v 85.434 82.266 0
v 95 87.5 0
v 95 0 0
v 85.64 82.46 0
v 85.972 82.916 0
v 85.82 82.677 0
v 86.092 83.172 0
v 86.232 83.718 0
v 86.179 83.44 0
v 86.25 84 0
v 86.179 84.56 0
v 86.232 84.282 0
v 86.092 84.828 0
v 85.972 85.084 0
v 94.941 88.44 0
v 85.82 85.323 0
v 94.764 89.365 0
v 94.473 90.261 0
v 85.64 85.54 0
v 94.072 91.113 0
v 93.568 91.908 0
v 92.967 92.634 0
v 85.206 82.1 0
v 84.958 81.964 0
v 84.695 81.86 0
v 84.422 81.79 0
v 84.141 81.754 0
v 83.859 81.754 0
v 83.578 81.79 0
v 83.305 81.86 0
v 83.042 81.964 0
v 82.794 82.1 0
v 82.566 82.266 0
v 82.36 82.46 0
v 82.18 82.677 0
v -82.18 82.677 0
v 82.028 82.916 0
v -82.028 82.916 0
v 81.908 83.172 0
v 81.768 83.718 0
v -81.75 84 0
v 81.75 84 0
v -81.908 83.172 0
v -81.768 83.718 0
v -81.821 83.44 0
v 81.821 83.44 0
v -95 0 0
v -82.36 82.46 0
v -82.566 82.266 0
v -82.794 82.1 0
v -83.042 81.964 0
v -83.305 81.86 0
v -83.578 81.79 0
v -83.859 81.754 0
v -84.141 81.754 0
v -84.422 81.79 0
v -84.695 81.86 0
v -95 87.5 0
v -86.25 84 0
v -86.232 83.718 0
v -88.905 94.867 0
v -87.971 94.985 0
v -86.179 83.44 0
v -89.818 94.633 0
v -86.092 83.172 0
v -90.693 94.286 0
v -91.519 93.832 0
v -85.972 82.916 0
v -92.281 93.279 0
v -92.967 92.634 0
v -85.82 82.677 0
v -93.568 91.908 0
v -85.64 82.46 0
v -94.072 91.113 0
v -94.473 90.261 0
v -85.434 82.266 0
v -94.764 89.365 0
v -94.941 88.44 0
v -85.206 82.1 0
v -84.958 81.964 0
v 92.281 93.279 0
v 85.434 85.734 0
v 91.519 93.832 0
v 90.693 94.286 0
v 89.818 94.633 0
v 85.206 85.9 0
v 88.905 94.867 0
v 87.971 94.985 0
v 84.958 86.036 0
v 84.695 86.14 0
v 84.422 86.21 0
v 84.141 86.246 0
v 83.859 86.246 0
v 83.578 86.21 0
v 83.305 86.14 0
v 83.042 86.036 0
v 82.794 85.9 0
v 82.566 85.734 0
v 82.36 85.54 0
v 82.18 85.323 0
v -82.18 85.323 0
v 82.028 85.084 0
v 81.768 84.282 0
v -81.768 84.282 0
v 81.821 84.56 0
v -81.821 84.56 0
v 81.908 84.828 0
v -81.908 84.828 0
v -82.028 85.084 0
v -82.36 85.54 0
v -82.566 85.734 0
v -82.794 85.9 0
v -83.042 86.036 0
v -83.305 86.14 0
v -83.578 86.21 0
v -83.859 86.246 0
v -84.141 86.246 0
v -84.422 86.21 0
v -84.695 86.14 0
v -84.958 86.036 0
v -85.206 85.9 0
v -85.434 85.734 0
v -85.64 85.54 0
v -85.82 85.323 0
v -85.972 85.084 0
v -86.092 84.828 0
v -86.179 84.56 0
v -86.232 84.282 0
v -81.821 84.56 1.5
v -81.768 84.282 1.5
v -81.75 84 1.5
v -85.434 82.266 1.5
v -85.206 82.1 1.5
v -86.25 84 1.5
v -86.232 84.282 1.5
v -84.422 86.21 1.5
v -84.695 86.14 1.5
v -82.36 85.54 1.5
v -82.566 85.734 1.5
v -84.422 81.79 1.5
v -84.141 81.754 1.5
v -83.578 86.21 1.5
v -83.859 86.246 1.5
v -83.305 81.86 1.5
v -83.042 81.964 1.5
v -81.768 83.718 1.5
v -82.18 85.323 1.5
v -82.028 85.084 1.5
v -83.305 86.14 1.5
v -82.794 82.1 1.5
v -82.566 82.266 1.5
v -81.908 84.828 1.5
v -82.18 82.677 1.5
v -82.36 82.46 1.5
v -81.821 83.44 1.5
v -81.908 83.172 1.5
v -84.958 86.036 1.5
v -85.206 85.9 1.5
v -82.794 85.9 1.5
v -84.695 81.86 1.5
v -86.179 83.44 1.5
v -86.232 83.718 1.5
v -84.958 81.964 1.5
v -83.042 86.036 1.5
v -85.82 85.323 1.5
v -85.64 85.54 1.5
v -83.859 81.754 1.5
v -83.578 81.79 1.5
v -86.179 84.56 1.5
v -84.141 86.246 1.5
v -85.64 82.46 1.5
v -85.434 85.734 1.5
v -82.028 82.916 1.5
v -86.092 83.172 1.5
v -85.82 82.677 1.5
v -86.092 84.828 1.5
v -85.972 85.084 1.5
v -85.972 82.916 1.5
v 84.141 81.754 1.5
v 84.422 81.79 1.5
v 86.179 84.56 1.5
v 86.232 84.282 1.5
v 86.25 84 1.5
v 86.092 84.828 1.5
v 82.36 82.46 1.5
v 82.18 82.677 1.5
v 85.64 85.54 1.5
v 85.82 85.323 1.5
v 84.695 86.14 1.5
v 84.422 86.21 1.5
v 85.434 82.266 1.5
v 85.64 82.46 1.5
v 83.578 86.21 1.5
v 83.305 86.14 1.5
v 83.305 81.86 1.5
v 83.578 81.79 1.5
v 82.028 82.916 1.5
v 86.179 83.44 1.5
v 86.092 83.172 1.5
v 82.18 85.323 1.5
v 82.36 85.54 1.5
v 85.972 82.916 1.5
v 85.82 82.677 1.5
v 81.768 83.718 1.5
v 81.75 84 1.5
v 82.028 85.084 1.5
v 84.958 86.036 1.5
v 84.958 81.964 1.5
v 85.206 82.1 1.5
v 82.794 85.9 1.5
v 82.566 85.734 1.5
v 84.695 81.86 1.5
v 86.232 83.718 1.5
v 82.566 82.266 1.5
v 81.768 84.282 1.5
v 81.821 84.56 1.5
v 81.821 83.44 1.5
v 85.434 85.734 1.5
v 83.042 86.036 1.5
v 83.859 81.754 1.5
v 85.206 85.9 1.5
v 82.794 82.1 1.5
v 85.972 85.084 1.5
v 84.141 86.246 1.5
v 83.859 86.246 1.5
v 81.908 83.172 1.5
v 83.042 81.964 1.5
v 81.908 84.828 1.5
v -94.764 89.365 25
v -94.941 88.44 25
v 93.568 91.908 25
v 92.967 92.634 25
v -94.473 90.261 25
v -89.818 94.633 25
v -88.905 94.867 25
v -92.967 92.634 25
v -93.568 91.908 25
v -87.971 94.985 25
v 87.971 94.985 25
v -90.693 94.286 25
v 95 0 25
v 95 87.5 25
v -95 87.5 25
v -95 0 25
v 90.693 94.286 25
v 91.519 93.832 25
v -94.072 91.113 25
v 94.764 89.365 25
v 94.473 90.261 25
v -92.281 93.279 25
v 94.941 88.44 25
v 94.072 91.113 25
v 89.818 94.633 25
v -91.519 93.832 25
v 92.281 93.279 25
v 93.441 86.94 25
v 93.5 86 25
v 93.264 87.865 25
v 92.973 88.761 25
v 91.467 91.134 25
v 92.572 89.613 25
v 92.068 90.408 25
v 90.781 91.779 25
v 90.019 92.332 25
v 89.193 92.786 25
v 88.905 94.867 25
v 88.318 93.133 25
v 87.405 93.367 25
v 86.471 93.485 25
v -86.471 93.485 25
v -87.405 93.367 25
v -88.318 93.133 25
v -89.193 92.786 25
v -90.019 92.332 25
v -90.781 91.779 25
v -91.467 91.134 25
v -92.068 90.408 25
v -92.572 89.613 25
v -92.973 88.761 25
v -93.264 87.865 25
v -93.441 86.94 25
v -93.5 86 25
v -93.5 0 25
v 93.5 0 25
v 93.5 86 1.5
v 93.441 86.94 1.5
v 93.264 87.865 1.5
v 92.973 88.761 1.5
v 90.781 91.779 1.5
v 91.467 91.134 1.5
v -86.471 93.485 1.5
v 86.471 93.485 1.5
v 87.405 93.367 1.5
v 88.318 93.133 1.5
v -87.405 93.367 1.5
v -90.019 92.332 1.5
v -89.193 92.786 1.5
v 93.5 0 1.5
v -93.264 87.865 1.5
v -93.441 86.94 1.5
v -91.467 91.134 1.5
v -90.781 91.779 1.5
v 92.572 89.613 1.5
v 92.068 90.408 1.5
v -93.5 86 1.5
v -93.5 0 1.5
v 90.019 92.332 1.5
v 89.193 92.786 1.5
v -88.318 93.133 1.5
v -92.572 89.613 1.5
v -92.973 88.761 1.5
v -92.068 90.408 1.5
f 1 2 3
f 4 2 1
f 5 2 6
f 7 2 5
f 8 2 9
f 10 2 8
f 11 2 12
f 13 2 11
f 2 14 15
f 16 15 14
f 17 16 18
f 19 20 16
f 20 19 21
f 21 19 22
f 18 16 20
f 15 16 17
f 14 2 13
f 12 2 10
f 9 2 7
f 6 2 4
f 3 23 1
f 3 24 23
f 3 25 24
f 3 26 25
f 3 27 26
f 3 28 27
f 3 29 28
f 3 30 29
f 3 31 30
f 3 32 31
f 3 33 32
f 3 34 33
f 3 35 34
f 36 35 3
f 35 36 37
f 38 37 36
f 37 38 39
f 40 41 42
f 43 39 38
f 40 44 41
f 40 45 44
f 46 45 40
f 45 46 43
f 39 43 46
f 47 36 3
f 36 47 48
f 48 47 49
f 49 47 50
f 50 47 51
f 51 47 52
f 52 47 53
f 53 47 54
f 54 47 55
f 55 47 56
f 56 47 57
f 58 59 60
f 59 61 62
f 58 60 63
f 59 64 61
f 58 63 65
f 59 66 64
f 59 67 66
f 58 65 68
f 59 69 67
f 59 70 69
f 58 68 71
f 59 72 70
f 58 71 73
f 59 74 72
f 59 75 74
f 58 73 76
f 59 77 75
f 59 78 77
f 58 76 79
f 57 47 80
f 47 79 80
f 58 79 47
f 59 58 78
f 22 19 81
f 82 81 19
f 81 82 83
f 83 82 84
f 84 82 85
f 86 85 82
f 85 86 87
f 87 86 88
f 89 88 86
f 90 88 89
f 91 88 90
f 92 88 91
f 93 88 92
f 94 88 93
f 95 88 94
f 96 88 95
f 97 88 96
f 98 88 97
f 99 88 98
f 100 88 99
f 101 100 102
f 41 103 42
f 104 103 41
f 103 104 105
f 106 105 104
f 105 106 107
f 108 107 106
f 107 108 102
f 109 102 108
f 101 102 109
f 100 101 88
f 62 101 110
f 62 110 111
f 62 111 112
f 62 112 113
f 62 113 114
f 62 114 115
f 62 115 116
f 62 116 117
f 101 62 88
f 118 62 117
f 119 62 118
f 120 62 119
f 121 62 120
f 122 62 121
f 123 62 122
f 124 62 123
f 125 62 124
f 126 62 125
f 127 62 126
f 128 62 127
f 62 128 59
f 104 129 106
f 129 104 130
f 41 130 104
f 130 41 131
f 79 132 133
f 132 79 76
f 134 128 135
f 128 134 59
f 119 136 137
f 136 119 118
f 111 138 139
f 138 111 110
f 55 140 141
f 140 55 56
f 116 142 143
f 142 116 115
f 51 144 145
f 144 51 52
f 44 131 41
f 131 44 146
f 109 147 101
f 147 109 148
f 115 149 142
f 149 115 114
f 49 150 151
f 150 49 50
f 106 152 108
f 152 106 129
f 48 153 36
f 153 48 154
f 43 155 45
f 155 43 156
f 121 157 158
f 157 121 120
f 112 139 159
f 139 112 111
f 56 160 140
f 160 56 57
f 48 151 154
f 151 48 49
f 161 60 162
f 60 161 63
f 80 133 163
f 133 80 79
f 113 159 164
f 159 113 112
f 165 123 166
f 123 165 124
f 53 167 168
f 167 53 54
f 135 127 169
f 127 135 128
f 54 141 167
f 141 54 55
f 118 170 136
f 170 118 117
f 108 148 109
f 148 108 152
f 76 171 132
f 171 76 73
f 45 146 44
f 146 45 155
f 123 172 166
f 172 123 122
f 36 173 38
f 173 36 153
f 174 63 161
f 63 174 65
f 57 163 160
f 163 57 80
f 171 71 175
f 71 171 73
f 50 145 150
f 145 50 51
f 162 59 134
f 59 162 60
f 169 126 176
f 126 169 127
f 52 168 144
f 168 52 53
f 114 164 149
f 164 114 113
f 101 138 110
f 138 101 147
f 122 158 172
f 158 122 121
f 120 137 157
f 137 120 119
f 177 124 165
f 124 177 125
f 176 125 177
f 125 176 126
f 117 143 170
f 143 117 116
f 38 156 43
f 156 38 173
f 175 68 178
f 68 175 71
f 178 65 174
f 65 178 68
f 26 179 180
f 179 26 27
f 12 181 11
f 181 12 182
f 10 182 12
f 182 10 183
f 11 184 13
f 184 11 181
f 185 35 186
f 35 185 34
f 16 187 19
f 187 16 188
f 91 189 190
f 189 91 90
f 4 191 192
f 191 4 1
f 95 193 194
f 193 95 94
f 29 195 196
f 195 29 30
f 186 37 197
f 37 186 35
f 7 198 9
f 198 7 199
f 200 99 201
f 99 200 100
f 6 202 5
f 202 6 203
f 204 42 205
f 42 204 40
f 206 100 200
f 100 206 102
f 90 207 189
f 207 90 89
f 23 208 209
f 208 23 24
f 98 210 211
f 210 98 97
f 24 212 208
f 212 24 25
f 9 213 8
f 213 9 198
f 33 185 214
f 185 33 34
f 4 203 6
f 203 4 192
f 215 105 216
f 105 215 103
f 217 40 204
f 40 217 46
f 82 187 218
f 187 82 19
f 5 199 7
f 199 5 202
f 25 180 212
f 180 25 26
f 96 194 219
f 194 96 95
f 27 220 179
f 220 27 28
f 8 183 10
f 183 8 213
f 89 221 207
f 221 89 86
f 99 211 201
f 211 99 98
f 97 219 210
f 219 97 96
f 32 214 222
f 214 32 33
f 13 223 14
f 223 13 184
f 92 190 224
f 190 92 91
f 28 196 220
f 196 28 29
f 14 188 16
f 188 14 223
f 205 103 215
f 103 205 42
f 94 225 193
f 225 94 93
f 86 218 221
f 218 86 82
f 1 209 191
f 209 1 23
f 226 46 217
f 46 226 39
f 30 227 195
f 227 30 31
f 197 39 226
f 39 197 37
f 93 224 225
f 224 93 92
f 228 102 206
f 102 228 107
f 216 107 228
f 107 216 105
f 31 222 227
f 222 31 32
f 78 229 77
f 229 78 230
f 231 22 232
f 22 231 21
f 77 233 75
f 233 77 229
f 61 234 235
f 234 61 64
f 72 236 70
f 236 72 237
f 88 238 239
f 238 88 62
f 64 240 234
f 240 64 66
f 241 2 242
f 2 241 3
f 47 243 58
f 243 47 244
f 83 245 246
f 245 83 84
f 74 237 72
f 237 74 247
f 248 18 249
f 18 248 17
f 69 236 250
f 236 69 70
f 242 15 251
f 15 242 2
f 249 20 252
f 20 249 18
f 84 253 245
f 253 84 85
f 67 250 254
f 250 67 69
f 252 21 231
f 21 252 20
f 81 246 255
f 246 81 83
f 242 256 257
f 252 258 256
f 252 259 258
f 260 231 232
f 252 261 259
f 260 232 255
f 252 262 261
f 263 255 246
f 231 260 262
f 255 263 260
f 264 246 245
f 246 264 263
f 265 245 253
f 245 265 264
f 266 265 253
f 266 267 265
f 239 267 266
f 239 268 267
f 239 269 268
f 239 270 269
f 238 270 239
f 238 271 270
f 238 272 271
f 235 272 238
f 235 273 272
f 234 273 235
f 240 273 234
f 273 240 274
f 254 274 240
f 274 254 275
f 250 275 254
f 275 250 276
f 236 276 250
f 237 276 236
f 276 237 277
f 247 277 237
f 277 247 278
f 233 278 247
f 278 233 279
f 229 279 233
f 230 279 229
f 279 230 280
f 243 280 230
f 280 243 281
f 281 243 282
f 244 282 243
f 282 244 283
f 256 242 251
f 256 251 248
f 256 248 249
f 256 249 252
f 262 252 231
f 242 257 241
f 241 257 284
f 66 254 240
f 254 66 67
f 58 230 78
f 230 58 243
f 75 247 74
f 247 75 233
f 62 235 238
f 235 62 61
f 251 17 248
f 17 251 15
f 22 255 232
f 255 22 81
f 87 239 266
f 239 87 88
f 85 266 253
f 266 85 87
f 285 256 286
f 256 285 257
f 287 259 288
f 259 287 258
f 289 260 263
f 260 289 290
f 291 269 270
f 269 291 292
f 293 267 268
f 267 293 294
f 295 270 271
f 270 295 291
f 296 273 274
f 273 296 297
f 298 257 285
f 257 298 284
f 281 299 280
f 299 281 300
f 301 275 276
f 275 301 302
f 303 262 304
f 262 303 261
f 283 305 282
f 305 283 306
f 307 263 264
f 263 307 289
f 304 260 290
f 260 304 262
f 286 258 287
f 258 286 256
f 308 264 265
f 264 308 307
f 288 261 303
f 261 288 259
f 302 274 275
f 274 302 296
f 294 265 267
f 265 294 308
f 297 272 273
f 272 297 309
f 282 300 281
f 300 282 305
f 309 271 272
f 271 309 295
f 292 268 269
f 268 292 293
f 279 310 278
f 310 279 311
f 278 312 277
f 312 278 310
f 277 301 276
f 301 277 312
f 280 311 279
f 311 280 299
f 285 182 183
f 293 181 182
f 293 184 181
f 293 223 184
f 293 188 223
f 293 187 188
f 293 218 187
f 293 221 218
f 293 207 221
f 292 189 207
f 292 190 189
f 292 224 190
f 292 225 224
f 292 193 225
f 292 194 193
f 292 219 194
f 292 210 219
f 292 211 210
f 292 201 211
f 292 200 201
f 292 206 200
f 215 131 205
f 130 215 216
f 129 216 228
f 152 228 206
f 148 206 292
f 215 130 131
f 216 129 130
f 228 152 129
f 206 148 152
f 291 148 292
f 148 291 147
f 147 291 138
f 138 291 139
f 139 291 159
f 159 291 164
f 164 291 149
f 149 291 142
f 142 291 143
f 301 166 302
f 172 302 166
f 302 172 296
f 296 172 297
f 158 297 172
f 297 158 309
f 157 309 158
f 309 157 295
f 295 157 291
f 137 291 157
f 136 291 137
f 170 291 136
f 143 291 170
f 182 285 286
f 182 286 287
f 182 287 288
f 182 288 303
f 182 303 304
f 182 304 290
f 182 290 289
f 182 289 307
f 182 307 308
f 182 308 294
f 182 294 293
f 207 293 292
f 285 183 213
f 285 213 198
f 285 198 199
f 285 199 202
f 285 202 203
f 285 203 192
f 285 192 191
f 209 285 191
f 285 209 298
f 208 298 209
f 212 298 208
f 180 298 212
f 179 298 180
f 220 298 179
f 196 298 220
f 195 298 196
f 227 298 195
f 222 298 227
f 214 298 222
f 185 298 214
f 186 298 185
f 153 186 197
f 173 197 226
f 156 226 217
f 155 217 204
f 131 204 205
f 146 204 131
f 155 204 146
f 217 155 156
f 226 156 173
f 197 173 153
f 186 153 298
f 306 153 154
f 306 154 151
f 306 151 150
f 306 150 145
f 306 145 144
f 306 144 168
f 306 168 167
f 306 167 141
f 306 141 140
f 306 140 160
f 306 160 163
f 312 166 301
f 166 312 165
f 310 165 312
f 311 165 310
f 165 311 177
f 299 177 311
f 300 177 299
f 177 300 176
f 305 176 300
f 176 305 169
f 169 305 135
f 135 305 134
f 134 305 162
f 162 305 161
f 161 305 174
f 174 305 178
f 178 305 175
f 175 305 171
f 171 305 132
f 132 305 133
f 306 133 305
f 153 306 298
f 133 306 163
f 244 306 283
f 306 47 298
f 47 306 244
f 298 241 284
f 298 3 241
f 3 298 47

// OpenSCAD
WIDTH = 190;
HEIGHT = 25;
CORNER_DIA = 15;

WALL_THICKNESS = 1.5;

MOUNT_HOLE_DIA = 4.5;
MOUNT_HOLE_SPACING = 168;

PORTS = false;
SWITCH_WIDTH = 13;
SWITCH_LENGTH = 19;
SWITCH_OFFSET = -5;

IEC_WIDTH = 20;
IEC_LENGTH = 27;
IEC_HOLE_SPACING = 40;
IEC_HOLE_DIA = 3.2;
IEC_OFFSET = 30;

$fn = 50;

module mount_holes(width, length, height, dia) {
  for(i = [-1, 1]) {
    for(j = [-1, 1]) {
      translate([i * width/2, j * length/2, 0])
      cylinder(d = dia, h = height);
    }
  }
}

module outside() {
  hull()
  mount_holes(WIDTH-CORNER_DIA, WIDTH-CORNER_DIA, HEIGHT, CORNER_DIA);
}

module inside() {
  hull()
  mount_holes(WIDTH-CORNER_DIA - 2 * WALL_THICKNESS, WIDTH-CORNER_DIA - 2 * WALL_THICKNESS, HEIGHT, CORNER_DIA);
}

module iec() {
  cube(size = [IEC_LENGTH, WALL_THICKNESS * 2, IEC_WIDTH]);
  translate([-IEC_HOLE_SPACING/2 + IEC_LENGTH/2, 0, IEC_WIDTH/2])
  rotate([-90, 0, 0])
  cylinder(d = IEC_HOLE_DIA, h = WALL_THICKNESS * 2);

  translate([IEC_HOLE_SPACING/2 + IEC_LENGTH/2, 0, IEC_WIDTH/2])
  rotate([-90, 0, 0])
  cylinder(d = IEC_HOLE_DIA, h = WALL_THICKNESS * 2);
}

module switch() {
  cube(size = [SWITCH_LENGTH, WALL_THICKNESS * 2, SWITCH_WIDTH]);
}

module ports() {
  translate([IEC_OFFSET, 0, (HEIGHT + WALL_THICKNESS - IEC_WIDTH)/2])
  iec();

  translate([SWITCH_OFFSET, 0, (HEIGHT + WALL_THICKNESS - SWITCH_WIDTH)/2])
  switch();
}

intersection() {
  difference() {
    outside();

    #translate([0, 0, WALL_THICKNESS])
    inside();

    #mount_holes(MOUNT_HOLE_SPACING, MOUNT_HOLE_SPACING, HEIGHT, MOUNT_HOLE_DIA);

    #if(PORTS) {
      translate([0, WIDTH/2 - 2 * WALL_THICKNESS, 0])
      ports();
    }
  }

  translate([0, WIDTH/2, 0])
  cube(size = [WIDTH, WIDTH, 2 * HEIGHT], center = true);
}
